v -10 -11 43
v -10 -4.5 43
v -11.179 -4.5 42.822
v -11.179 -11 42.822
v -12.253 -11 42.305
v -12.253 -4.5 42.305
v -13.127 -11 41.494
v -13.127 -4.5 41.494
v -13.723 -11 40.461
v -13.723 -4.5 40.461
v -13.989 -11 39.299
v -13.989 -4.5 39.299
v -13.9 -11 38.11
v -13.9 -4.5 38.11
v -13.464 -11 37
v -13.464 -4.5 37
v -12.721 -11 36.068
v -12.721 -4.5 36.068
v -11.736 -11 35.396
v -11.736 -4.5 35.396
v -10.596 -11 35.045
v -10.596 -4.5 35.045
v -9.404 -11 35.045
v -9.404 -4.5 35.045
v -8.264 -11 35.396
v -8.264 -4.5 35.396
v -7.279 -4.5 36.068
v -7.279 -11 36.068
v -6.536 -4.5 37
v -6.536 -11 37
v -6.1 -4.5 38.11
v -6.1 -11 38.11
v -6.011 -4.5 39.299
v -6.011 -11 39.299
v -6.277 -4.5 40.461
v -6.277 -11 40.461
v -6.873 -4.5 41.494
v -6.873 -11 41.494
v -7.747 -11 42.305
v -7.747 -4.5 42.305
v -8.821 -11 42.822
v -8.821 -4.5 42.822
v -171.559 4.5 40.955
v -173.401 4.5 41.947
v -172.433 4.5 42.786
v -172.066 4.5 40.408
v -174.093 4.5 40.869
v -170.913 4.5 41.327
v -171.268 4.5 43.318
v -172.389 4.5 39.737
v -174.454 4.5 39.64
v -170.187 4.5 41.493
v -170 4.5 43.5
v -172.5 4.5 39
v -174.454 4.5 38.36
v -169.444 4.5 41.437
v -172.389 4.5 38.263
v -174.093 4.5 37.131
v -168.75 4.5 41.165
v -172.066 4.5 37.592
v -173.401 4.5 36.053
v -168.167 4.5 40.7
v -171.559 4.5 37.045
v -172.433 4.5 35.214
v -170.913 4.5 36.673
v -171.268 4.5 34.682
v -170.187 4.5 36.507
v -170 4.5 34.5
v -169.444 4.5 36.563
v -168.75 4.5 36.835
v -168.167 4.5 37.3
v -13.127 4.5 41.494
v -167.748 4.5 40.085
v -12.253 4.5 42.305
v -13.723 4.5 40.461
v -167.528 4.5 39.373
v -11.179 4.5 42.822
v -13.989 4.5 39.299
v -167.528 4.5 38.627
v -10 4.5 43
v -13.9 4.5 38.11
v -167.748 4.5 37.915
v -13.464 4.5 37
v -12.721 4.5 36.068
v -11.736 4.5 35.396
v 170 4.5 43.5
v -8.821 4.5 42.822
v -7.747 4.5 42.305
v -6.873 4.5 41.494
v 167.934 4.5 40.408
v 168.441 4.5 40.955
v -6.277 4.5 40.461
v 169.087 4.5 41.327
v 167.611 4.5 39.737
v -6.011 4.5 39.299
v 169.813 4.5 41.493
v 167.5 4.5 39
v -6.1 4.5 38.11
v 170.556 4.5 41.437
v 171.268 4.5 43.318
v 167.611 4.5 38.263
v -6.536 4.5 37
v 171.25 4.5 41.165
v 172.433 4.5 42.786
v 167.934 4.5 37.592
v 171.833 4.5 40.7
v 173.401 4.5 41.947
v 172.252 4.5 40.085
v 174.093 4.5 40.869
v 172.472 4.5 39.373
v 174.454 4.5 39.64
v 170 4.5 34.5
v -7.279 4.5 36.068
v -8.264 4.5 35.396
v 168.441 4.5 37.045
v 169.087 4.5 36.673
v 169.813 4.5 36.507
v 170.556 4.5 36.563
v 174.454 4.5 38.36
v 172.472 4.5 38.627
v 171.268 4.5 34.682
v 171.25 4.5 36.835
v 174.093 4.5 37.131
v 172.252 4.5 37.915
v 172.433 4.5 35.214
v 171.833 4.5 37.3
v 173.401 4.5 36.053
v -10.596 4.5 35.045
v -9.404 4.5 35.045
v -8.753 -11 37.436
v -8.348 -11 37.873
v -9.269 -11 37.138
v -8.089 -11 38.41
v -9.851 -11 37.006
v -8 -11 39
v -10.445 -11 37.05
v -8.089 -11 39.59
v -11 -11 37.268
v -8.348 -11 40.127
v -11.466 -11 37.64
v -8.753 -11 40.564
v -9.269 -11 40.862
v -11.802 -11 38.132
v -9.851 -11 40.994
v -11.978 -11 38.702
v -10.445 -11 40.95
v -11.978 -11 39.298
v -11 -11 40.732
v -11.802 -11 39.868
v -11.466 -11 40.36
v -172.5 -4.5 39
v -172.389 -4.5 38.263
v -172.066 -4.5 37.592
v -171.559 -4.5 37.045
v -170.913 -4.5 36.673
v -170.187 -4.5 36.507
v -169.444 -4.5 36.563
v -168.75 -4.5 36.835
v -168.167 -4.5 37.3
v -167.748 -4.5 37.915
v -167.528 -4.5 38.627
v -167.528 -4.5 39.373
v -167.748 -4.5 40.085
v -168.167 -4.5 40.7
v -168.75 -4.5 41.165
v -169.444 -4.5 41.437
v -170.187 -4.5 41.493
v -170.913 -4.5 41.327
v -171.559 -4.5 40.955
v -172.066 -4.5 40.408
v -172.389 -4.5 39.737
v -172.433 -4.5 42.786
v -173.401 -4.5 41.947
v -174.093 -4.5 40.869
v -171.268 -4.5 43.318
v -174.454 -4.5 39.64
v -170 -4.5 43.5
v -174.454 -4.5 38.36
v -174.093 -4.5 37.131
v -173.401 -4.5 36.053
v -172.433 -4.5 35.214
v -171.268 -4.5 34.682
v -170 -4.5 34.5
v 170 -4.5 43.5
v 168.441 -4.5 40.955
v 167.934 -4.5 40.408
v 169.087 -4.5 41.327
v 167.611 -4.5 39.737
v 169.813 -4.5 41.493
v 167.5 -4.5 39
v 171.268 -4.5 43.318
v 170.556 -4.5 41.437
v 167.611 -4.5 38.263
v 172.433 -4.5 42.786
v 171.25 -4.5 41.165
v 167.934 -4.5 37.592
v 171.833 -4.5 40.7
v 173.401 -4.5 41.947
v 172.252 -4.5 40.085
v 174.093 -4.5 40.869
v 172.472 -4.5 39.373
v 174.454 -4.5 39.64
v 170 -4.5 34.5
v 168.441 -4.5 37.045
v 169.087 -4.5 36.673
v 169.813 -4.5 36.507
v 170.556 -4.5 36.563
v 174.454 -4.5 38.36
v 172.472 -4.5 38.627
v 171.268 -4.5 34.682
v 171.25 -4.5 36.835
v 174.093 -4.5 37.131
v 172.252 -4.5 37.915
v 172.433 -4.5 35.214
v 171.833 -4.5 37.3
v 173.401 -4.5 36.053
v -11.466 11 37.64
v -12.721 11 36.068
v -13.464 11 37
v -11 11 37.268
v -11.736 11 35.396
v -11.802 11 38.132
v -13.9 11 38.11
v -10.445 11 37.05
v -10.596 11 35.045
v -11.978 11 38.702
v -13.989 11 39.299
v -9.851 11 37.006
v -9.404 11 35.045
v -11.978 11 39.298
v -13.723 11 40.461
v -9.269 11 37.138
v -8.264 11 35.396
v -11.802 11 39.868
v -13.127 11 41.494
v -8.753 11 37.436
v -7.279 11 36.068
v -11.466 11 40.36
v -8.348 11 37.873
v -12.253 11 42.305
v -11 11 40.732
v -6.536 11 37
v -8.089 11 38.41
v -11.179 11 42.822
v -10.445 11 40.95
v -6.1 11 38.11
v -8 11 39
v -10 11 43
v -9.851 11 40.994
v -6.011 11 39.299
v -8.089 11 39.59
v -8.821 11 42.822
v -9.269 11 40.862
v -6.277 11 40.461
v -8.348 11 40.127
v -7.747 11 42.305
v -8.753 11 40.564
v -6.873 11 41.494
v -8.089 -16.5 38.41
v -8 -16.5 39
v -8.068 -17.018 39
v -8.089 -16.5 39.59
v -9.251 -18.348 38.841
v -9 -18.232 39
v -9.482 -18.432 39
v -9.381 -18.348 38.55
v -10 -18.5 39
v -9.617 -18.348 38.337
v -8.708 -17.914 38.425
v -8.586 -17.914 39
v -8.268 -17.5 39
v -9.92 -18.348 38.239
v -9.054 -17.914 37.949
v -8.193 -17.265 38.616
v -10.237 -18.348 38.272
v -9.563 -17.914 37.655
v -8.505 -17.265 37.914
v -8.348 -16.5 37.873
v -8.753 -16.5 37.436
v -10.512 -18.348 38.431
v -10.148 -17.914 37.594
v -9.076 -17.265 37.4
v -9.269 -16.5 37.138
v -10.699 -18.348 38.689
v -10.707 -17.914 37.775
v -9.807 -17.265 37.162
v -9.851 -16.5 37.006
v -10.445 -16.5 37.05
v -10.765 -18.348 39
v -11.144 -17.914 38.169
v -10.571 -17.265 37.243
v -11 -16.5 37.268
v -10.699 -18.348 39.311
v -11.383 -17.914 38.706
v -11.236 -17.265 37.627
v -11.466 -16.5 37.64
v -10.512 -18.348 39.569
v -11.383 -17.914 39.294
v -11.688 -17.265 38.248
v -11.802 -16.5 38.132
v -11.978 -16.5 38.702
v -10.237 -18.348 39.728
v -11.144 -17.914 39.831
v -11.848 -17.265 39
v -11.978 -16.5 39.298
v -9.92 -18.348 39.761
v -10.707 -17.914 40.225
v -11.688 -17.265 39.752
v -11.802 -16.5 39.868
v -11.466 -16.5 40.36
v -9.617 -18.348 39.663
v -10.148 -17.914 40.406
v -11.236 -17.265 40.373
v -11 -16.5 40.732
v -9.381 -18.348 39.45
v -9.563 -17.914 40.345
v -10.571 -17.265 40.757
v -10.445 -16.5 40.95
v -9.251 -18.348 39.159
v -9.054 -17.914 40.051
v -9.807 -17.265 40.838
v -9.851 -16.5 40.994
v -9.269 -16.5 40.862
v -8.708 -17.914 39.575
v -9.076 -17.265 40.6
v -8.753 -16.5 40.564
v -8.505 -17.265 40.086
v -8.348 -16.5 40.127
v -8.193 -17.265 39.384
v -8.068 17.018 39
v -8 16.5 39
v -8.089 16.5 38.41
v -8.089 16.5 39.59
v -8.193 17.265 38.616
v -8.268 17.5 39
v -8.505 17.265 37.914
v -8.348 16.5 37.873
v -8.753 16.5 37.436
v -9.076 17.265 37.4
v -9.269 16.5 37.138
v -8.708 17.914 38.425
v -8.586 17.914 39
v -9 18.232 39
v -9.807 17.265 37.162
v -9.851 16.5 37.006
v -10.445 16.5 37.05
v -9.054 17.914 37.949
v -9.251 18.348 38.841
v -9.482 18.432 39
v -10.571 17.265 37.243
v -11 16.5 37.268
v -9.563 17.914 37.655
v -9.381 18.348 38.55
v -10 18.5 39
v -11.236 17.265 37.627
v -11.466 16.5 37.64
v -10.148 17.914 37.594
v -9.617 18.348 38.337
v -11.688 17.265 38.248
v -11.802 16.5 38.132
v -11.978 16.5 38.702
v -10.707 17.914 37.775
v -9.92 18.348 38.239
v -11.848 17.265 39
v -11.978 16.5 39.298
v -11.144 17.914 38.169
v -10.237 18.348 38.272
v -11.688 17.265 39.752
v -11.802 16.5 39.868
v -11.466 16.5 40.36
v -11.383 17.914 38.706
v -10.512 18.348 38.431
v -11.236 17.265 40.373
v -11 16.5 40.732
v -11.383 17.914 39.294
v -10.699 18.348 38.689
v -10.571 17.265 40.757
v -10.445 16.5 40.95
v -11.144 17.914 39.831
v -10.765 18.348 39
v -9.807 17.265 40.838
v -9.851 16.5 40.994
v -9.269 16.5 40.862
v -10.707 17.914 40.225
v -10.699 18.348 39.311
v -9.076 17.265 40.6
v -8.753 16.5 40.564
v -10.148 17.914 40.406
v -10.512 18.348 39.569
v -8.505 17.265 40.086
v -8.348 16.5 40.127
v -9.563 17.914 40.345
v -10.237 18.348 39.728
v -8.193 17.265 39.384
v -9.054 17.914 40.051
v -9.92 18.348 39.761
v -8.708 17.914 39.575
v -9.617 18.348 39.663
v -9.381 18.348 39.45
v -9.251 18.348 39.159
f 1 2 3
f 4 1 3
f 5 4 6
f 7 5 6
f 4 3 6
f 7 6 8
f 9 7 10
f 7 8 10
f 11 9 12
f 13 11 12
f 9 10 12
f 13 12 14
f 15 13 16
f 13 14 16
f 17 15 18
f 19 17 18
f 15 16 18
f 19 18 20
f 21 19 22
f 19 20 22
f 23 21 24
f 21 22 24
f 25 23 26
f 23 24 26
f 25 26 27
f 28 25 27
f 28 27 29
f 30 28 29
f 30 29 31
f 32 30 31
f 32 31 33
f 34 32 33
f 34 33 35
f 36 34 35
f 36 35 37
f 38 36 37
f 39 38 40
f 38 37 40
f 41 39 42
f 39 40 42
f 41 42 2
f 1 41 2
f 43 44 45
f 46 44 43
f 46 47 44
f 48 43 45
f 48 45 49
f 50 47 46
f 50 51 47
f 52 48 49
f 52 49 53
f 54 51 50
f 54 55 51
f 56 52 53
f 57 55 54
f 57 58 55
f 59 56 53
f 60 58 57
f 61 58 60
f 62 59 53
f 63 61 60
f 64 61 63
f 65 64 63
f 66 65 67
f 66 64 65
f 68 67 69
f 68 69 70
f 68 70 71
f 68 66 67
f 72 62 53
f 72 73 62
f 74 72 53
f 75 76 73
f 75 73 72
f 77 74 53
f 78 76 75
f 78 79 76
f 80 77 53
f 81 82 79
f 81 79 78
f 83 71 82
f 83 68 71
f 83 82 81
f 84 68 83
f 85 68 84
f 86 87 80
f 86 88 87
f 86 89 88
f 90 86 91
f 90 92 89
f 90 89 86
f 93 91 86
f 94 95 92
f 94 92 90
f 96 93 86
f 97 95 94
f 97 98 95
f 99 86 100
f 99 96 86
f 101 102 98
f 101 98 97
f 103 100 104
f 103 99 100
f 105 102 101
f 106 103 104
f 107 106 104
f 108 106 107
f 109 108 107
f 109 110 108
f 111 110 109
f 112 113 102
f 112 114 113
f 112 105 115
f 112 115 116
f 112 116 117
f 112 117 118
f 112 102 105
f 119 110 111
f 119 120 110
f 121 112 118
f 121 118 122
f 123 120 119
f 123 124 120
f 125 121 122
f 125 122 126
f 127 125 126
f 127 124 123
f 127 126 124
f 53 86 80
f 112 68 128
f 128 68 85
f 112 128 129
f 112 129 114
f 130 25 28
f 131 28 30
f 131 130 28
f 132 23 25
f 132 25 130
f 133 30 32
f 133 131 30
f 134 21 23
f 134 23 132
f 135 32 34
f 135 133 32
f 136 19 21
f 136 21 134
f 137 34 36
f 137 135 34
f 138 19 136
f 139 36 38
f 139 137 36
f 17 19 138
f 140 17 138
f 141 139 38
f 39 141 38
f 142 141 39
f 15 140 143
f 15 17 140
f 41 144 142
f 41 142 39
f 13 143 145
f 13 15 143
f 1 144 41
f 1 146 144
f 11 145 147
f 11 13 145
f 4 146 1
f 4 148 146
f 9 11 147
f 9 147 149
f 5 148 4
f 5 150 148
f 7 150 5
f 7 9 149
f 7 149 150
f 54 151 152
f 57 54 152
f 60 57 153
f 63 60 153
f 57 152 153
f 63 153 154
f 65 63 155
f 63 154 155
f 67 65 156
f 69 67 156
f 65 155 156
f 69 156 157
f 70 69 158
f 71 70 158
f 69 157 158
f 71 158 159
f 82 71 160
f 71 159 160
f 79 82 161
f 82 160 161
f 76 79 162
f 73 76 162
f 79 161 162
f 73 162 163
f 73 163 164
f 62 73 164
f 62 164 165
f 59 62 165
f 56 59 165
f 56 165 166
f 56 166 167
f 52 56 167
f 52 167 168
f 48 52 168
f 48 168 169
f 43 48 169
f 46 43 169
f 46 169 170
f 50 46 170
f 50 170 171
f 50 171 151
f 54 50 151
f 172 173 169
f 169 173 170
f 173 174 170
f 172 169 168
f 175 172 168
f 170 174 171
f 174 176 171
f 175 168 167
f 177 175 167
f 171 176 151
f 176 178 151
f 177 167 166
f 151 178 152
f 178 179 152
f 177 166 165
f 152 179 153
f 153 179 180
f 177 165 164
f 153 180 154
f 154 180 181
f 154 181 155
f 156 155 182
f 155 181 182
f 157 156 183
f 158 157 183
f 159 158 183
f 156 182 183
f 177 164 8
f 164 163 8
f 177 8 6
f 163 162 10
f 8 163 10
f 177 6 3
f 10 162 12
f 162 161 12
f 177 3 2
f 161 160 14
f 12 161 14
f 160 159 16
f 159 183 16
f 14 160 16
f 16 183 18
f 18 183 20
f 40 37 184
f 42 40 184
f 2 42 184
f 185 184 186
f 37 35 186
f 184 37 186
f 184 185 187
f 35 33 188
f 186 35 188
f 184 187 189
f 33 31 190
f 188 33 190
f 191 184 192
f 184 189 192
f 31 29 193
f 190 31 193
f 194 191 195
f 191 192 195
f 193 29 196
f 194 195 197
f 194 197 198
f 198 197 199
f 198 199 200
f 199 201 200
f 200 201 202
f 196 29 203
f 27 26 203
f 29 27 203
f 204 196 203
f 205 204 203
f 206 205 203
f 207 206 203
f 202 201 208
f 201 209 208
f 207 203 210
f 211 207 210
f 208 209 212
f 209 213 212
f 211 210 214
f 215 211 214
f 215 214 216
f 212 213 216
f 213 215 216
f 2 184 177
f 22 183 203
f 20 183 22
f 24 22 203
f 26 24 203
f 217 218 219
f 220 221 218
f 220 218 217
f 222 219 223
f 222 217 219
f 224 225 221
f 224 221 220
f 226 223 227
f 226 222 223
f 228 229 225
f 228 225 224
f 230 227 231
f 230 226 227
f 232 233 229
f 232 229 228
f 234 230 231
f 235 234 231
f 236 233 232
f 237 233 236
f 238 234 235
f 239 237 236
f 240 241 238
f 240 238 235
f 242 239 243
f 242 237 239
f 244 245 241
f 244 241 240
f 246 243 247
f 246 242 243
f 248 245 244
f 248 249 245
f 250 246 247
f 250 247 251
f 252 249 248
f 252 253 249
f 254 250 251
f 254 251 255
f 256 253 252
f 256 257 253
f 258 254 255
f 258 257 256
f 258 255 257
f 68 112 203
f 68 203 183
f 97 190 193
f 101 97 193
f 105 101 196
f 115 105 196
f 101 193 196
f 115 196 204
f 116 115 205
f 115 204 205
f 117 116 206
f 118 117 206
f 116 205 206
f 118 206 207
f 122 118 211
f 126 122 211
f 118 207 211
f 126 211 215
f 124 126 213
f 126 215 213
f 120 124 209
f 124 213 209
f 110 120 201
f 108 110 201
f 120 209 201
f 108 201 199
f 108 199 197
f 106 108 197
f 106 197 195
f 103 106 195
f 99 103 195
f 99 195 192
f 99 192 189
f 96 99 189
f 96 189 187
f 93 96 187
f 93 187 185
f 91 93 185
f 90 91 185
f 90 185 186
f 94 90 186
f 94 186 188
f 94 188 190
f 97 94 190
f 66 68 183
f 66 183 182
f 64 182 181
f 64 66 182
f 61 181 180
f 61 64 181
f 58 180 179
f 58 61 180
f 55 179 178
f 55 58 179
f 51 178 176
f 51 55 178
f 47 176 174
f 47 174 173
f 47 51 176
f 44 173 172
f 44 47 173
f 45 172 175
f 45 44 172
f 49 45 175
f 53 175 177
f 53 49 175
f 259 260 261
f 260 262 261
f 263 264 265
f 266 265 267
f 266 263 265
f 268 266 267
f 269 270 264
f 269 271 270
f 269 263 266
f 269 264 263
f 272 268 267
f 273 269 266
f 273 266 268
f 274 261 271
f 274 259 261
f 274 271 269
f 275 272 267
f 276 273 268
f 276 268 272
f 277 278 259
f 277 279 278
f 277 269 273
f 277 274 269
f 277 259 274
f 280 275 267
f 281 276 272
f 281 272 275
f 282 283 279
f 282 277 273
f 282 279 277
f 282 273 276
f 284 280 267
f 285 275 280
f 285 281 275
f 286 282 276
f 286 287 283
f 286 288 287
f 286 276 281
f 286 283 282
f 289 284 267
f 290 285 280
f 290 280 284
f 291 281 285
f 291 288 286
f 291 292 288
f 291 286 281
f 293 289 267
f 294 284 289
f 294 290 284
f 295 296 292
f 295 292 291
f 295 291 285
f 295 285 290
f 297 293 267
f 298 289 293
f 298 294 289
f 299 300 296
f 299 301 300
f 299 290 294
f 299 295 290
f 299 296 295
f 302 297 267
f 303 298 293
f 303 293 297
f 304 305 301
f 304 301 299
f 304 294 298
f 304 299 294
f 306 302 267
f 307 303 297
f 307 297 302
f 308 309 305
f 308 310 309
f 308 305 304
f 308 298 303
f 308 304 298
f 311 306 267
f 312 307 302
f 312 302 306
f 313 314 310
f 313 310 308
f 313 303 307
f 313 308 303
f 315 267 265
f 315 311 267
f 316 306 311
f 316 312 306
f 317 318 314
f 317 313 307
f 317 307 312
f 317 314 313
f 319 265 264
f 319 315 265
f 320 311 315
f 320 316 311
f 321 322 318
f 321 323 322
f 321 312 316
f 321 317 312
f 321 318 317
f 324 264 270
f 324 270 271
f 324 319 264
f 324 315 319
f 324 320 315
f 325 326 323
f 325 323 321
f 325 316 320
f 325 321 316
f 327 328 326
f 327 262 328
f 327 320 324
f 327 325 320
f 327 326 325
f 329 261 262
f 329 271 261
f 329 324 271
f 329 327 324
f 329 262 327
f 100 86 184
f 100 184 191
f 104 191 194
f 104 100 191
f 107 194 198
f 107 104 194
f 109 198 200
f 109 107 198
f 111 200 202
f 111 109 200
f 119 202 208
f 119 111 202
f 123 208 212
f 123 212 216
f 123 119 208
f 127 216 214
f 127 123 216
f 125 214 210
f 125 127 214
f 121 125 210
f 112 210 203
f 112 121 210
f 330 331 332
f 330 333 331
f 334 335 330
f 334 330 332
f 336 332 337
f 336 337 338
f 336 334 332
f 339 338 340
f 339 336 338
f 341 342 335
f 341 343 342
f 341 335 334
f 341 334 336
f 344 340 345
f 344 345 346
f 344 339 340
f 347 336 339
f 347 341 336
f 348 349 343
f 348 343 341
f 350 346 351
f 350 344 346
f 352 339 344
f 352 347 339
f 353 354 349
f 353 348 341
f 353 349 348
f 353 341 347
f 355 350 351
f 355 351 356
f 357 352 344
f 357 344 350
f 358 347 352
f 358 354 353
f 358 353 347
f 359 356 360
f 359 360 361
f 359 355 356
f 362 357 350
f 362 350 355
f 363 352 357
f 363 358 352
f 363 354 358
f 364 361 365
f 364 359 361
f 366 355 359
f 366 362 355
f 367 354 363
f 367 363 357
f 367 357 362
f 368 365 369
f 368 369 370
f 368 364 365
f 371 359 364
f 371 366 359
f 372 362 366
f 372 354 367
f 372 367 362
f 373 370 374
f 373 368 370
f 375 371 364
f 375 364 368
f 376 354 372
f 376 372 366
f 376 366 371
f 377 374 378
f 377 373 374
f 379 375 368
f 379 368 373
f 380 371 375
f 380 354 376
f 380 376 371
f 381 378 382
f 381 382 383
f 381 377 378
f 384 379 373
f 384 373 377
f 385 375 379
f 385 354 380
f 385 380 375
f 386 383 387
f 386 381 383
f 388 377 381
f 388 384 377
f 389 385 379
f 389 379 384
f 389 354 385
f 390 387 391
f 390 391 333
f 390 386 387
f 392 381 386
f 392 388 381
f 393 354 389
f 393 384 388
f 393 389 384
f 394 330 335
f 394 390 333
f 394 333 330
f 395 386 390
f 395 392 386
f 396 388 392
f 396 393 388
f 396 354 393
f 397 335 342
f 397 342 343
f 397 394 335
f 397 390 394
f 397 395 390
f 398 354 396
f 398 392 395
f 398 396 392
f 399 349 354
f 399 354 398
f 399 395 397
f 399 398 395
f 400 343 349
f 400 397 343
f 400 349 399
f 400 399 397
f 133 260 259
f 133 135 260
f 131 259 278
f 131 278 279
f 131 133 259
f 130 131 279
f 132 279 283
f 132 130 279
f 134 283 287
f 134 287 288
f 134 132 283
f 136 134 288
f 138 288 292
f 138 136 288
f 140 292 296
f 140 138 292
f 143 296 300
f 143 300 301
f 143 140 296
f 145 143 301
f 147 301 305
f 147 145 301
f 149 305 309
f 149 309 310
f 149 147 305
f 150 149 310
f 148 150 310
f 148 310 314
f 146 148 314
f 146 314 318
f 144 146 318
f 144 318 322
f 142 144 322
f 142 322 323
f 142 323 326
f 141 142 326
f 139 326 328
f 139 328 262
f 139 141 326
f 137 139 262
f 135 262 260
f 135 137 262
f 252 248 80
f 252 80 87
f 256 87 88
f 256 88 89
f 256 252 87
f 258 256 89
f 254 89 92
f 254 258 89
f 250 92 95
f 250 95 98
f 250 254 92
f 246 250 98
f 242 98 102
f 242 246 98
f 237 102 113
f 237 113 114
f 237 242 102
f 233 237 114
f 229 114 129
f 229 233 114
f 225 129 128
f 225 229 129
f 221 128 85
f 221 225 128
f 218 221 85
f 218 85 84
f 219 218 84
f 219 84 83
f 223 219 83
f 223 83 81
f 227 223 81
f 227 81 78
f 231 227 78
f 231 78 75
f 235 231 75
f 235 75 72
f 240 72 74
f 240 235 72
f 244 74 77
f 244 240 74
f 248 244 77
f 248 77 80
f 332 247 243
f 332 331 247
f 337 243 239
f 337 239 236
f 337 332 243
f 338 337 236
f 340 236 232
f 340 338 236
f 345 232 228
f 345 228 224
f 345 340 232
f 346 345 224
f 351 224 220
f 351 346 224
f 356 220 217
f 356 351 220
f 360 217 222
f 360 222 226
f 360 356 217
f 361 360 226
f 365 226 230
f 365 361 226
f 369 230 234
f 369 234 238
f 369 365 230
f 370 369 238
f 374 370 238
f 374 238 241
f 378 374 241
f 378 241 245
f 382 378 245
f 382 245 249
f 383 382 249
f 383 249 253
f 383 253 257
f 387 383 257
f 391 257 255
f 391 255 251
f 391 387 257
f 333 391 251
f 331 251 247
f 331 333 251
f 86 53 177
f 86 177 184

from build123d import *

# Parameters (mm, degrees)
BOSS_EXTRUDE1_DEPTH          = 9
SKETCH2_R                    = 4
BOSS_EXTRUDE2_DEPTH          = 6.5
BOSS_EXTRUDE4_START          = 6.5
SKETCH4_R                    = 4
BOSS_EXTRUDE4_DEPTH          = 6.5
F_5_0_5_DIAMETER_HOLE1_D     = 5
F_5_0_5_DIAMETER_HOLE1_DEPTH = 23


# Read off the part's stored shape, not the designer's step: Boss-Extrude3, Boss-Extrude5
with BuildPart() as part:
    # Sketch1 → Boss-Extrude1 (new body)
    with BuildSketch(Plane(origin=(0, 4.5, 0), x_dir=(1, 0, 0), z_dir=(0, 1, 0))):
        with BuildLine():
            Line((-170, -43.5), (170, -43.5))
            ThreePointArc((170, -43.5), (174.5, -39), (170, -34.5))
            Line((170, -34.5), (-170, -34.5))
            ThreePointArc((-170, -34.5), (-174.5, -39), (-170, -43.5))
        make_face()
    extrude(amount=-BOSS_EXTRUDE1_DEPTH)

    # Sketch2 → Boss-Extrude2 (add)
    with BuildSketch(Plane.XZ.offset(4.5)):
        with Locations(Location((-10, 39, 0), (0, 0, 90))):
            Circle(SKETCH2_R)
    extrude(amount=BOSS_EXTRUDE2_DEPTH)

    # Boss-Extrude3 outline → Boss-Extrude3 (revolve)
    with BuildSketch(Plane(origin=(-10, 0, 39), x_dir=(1, 0, 0), z_dir=(0, 0, 1))):
        with BuildLine():
            ThreePointArc((0, -18.5), (1.414213563, -17.914213562), (2, -16.499999998))
            Line((2, -16.499999998), (2, -11))
            Line((2, -11), (0, -11))
            Line((0, -11), (0, -18.5))
        make_face()
    revolve(axis=Axis((-10, 0, 39), (0, 1, 0)))

    # Sketch4 → Boss-Extrude4 (add)
    with BuildSketch(Plane(origin=(0, 4.5, 0), x_dir=(-1, 0, 0), z_dir=(0, 1, 0)).offset(BOSS_EXTRUDE4_START)):
        with Locations(Location((10, 39, 0), (0, 0, 90))):
            Circle(SKETCH4_R)
    extrude(amount=-BOSS_EXTRUDE4_DEPTH)

    # Boss-Extrude5 outline → Boss-Extrude5 (revolve)
    with BuildSketch(Plane(origin=(-10, 0, 39), x_dir=(1, 0, 0), z_dir=(0, 0, 1))):
        with BuildLine():
            Line((2, 11), (2, 16.499999998))
            ThreePointArc((2, 16.499999998), (1.414213563, 17.914213562), (0, 18.5))
            Line((0, 18.5), (0, 11))
            Line((0, 11), (2, 11))
        make_face()
    revolve(axis=Axis((-10, 0, 39), (0, 1, 0)))

    # Ø5.0 (5) Diameter Hole1
    with Locations(Plane(origin=(0, 4.5, 0), x_dir=(1, 0, 0), z_dir=(0, 1, 0))):
        with Locations((-170, -39), (170, -39)):
            Hole(F_5_0_5_DIAMETER_HOLE1_D / 2, depth=F_5_0_5_DIAMETER_HOLE1_DEPTH)


solid = part.part
